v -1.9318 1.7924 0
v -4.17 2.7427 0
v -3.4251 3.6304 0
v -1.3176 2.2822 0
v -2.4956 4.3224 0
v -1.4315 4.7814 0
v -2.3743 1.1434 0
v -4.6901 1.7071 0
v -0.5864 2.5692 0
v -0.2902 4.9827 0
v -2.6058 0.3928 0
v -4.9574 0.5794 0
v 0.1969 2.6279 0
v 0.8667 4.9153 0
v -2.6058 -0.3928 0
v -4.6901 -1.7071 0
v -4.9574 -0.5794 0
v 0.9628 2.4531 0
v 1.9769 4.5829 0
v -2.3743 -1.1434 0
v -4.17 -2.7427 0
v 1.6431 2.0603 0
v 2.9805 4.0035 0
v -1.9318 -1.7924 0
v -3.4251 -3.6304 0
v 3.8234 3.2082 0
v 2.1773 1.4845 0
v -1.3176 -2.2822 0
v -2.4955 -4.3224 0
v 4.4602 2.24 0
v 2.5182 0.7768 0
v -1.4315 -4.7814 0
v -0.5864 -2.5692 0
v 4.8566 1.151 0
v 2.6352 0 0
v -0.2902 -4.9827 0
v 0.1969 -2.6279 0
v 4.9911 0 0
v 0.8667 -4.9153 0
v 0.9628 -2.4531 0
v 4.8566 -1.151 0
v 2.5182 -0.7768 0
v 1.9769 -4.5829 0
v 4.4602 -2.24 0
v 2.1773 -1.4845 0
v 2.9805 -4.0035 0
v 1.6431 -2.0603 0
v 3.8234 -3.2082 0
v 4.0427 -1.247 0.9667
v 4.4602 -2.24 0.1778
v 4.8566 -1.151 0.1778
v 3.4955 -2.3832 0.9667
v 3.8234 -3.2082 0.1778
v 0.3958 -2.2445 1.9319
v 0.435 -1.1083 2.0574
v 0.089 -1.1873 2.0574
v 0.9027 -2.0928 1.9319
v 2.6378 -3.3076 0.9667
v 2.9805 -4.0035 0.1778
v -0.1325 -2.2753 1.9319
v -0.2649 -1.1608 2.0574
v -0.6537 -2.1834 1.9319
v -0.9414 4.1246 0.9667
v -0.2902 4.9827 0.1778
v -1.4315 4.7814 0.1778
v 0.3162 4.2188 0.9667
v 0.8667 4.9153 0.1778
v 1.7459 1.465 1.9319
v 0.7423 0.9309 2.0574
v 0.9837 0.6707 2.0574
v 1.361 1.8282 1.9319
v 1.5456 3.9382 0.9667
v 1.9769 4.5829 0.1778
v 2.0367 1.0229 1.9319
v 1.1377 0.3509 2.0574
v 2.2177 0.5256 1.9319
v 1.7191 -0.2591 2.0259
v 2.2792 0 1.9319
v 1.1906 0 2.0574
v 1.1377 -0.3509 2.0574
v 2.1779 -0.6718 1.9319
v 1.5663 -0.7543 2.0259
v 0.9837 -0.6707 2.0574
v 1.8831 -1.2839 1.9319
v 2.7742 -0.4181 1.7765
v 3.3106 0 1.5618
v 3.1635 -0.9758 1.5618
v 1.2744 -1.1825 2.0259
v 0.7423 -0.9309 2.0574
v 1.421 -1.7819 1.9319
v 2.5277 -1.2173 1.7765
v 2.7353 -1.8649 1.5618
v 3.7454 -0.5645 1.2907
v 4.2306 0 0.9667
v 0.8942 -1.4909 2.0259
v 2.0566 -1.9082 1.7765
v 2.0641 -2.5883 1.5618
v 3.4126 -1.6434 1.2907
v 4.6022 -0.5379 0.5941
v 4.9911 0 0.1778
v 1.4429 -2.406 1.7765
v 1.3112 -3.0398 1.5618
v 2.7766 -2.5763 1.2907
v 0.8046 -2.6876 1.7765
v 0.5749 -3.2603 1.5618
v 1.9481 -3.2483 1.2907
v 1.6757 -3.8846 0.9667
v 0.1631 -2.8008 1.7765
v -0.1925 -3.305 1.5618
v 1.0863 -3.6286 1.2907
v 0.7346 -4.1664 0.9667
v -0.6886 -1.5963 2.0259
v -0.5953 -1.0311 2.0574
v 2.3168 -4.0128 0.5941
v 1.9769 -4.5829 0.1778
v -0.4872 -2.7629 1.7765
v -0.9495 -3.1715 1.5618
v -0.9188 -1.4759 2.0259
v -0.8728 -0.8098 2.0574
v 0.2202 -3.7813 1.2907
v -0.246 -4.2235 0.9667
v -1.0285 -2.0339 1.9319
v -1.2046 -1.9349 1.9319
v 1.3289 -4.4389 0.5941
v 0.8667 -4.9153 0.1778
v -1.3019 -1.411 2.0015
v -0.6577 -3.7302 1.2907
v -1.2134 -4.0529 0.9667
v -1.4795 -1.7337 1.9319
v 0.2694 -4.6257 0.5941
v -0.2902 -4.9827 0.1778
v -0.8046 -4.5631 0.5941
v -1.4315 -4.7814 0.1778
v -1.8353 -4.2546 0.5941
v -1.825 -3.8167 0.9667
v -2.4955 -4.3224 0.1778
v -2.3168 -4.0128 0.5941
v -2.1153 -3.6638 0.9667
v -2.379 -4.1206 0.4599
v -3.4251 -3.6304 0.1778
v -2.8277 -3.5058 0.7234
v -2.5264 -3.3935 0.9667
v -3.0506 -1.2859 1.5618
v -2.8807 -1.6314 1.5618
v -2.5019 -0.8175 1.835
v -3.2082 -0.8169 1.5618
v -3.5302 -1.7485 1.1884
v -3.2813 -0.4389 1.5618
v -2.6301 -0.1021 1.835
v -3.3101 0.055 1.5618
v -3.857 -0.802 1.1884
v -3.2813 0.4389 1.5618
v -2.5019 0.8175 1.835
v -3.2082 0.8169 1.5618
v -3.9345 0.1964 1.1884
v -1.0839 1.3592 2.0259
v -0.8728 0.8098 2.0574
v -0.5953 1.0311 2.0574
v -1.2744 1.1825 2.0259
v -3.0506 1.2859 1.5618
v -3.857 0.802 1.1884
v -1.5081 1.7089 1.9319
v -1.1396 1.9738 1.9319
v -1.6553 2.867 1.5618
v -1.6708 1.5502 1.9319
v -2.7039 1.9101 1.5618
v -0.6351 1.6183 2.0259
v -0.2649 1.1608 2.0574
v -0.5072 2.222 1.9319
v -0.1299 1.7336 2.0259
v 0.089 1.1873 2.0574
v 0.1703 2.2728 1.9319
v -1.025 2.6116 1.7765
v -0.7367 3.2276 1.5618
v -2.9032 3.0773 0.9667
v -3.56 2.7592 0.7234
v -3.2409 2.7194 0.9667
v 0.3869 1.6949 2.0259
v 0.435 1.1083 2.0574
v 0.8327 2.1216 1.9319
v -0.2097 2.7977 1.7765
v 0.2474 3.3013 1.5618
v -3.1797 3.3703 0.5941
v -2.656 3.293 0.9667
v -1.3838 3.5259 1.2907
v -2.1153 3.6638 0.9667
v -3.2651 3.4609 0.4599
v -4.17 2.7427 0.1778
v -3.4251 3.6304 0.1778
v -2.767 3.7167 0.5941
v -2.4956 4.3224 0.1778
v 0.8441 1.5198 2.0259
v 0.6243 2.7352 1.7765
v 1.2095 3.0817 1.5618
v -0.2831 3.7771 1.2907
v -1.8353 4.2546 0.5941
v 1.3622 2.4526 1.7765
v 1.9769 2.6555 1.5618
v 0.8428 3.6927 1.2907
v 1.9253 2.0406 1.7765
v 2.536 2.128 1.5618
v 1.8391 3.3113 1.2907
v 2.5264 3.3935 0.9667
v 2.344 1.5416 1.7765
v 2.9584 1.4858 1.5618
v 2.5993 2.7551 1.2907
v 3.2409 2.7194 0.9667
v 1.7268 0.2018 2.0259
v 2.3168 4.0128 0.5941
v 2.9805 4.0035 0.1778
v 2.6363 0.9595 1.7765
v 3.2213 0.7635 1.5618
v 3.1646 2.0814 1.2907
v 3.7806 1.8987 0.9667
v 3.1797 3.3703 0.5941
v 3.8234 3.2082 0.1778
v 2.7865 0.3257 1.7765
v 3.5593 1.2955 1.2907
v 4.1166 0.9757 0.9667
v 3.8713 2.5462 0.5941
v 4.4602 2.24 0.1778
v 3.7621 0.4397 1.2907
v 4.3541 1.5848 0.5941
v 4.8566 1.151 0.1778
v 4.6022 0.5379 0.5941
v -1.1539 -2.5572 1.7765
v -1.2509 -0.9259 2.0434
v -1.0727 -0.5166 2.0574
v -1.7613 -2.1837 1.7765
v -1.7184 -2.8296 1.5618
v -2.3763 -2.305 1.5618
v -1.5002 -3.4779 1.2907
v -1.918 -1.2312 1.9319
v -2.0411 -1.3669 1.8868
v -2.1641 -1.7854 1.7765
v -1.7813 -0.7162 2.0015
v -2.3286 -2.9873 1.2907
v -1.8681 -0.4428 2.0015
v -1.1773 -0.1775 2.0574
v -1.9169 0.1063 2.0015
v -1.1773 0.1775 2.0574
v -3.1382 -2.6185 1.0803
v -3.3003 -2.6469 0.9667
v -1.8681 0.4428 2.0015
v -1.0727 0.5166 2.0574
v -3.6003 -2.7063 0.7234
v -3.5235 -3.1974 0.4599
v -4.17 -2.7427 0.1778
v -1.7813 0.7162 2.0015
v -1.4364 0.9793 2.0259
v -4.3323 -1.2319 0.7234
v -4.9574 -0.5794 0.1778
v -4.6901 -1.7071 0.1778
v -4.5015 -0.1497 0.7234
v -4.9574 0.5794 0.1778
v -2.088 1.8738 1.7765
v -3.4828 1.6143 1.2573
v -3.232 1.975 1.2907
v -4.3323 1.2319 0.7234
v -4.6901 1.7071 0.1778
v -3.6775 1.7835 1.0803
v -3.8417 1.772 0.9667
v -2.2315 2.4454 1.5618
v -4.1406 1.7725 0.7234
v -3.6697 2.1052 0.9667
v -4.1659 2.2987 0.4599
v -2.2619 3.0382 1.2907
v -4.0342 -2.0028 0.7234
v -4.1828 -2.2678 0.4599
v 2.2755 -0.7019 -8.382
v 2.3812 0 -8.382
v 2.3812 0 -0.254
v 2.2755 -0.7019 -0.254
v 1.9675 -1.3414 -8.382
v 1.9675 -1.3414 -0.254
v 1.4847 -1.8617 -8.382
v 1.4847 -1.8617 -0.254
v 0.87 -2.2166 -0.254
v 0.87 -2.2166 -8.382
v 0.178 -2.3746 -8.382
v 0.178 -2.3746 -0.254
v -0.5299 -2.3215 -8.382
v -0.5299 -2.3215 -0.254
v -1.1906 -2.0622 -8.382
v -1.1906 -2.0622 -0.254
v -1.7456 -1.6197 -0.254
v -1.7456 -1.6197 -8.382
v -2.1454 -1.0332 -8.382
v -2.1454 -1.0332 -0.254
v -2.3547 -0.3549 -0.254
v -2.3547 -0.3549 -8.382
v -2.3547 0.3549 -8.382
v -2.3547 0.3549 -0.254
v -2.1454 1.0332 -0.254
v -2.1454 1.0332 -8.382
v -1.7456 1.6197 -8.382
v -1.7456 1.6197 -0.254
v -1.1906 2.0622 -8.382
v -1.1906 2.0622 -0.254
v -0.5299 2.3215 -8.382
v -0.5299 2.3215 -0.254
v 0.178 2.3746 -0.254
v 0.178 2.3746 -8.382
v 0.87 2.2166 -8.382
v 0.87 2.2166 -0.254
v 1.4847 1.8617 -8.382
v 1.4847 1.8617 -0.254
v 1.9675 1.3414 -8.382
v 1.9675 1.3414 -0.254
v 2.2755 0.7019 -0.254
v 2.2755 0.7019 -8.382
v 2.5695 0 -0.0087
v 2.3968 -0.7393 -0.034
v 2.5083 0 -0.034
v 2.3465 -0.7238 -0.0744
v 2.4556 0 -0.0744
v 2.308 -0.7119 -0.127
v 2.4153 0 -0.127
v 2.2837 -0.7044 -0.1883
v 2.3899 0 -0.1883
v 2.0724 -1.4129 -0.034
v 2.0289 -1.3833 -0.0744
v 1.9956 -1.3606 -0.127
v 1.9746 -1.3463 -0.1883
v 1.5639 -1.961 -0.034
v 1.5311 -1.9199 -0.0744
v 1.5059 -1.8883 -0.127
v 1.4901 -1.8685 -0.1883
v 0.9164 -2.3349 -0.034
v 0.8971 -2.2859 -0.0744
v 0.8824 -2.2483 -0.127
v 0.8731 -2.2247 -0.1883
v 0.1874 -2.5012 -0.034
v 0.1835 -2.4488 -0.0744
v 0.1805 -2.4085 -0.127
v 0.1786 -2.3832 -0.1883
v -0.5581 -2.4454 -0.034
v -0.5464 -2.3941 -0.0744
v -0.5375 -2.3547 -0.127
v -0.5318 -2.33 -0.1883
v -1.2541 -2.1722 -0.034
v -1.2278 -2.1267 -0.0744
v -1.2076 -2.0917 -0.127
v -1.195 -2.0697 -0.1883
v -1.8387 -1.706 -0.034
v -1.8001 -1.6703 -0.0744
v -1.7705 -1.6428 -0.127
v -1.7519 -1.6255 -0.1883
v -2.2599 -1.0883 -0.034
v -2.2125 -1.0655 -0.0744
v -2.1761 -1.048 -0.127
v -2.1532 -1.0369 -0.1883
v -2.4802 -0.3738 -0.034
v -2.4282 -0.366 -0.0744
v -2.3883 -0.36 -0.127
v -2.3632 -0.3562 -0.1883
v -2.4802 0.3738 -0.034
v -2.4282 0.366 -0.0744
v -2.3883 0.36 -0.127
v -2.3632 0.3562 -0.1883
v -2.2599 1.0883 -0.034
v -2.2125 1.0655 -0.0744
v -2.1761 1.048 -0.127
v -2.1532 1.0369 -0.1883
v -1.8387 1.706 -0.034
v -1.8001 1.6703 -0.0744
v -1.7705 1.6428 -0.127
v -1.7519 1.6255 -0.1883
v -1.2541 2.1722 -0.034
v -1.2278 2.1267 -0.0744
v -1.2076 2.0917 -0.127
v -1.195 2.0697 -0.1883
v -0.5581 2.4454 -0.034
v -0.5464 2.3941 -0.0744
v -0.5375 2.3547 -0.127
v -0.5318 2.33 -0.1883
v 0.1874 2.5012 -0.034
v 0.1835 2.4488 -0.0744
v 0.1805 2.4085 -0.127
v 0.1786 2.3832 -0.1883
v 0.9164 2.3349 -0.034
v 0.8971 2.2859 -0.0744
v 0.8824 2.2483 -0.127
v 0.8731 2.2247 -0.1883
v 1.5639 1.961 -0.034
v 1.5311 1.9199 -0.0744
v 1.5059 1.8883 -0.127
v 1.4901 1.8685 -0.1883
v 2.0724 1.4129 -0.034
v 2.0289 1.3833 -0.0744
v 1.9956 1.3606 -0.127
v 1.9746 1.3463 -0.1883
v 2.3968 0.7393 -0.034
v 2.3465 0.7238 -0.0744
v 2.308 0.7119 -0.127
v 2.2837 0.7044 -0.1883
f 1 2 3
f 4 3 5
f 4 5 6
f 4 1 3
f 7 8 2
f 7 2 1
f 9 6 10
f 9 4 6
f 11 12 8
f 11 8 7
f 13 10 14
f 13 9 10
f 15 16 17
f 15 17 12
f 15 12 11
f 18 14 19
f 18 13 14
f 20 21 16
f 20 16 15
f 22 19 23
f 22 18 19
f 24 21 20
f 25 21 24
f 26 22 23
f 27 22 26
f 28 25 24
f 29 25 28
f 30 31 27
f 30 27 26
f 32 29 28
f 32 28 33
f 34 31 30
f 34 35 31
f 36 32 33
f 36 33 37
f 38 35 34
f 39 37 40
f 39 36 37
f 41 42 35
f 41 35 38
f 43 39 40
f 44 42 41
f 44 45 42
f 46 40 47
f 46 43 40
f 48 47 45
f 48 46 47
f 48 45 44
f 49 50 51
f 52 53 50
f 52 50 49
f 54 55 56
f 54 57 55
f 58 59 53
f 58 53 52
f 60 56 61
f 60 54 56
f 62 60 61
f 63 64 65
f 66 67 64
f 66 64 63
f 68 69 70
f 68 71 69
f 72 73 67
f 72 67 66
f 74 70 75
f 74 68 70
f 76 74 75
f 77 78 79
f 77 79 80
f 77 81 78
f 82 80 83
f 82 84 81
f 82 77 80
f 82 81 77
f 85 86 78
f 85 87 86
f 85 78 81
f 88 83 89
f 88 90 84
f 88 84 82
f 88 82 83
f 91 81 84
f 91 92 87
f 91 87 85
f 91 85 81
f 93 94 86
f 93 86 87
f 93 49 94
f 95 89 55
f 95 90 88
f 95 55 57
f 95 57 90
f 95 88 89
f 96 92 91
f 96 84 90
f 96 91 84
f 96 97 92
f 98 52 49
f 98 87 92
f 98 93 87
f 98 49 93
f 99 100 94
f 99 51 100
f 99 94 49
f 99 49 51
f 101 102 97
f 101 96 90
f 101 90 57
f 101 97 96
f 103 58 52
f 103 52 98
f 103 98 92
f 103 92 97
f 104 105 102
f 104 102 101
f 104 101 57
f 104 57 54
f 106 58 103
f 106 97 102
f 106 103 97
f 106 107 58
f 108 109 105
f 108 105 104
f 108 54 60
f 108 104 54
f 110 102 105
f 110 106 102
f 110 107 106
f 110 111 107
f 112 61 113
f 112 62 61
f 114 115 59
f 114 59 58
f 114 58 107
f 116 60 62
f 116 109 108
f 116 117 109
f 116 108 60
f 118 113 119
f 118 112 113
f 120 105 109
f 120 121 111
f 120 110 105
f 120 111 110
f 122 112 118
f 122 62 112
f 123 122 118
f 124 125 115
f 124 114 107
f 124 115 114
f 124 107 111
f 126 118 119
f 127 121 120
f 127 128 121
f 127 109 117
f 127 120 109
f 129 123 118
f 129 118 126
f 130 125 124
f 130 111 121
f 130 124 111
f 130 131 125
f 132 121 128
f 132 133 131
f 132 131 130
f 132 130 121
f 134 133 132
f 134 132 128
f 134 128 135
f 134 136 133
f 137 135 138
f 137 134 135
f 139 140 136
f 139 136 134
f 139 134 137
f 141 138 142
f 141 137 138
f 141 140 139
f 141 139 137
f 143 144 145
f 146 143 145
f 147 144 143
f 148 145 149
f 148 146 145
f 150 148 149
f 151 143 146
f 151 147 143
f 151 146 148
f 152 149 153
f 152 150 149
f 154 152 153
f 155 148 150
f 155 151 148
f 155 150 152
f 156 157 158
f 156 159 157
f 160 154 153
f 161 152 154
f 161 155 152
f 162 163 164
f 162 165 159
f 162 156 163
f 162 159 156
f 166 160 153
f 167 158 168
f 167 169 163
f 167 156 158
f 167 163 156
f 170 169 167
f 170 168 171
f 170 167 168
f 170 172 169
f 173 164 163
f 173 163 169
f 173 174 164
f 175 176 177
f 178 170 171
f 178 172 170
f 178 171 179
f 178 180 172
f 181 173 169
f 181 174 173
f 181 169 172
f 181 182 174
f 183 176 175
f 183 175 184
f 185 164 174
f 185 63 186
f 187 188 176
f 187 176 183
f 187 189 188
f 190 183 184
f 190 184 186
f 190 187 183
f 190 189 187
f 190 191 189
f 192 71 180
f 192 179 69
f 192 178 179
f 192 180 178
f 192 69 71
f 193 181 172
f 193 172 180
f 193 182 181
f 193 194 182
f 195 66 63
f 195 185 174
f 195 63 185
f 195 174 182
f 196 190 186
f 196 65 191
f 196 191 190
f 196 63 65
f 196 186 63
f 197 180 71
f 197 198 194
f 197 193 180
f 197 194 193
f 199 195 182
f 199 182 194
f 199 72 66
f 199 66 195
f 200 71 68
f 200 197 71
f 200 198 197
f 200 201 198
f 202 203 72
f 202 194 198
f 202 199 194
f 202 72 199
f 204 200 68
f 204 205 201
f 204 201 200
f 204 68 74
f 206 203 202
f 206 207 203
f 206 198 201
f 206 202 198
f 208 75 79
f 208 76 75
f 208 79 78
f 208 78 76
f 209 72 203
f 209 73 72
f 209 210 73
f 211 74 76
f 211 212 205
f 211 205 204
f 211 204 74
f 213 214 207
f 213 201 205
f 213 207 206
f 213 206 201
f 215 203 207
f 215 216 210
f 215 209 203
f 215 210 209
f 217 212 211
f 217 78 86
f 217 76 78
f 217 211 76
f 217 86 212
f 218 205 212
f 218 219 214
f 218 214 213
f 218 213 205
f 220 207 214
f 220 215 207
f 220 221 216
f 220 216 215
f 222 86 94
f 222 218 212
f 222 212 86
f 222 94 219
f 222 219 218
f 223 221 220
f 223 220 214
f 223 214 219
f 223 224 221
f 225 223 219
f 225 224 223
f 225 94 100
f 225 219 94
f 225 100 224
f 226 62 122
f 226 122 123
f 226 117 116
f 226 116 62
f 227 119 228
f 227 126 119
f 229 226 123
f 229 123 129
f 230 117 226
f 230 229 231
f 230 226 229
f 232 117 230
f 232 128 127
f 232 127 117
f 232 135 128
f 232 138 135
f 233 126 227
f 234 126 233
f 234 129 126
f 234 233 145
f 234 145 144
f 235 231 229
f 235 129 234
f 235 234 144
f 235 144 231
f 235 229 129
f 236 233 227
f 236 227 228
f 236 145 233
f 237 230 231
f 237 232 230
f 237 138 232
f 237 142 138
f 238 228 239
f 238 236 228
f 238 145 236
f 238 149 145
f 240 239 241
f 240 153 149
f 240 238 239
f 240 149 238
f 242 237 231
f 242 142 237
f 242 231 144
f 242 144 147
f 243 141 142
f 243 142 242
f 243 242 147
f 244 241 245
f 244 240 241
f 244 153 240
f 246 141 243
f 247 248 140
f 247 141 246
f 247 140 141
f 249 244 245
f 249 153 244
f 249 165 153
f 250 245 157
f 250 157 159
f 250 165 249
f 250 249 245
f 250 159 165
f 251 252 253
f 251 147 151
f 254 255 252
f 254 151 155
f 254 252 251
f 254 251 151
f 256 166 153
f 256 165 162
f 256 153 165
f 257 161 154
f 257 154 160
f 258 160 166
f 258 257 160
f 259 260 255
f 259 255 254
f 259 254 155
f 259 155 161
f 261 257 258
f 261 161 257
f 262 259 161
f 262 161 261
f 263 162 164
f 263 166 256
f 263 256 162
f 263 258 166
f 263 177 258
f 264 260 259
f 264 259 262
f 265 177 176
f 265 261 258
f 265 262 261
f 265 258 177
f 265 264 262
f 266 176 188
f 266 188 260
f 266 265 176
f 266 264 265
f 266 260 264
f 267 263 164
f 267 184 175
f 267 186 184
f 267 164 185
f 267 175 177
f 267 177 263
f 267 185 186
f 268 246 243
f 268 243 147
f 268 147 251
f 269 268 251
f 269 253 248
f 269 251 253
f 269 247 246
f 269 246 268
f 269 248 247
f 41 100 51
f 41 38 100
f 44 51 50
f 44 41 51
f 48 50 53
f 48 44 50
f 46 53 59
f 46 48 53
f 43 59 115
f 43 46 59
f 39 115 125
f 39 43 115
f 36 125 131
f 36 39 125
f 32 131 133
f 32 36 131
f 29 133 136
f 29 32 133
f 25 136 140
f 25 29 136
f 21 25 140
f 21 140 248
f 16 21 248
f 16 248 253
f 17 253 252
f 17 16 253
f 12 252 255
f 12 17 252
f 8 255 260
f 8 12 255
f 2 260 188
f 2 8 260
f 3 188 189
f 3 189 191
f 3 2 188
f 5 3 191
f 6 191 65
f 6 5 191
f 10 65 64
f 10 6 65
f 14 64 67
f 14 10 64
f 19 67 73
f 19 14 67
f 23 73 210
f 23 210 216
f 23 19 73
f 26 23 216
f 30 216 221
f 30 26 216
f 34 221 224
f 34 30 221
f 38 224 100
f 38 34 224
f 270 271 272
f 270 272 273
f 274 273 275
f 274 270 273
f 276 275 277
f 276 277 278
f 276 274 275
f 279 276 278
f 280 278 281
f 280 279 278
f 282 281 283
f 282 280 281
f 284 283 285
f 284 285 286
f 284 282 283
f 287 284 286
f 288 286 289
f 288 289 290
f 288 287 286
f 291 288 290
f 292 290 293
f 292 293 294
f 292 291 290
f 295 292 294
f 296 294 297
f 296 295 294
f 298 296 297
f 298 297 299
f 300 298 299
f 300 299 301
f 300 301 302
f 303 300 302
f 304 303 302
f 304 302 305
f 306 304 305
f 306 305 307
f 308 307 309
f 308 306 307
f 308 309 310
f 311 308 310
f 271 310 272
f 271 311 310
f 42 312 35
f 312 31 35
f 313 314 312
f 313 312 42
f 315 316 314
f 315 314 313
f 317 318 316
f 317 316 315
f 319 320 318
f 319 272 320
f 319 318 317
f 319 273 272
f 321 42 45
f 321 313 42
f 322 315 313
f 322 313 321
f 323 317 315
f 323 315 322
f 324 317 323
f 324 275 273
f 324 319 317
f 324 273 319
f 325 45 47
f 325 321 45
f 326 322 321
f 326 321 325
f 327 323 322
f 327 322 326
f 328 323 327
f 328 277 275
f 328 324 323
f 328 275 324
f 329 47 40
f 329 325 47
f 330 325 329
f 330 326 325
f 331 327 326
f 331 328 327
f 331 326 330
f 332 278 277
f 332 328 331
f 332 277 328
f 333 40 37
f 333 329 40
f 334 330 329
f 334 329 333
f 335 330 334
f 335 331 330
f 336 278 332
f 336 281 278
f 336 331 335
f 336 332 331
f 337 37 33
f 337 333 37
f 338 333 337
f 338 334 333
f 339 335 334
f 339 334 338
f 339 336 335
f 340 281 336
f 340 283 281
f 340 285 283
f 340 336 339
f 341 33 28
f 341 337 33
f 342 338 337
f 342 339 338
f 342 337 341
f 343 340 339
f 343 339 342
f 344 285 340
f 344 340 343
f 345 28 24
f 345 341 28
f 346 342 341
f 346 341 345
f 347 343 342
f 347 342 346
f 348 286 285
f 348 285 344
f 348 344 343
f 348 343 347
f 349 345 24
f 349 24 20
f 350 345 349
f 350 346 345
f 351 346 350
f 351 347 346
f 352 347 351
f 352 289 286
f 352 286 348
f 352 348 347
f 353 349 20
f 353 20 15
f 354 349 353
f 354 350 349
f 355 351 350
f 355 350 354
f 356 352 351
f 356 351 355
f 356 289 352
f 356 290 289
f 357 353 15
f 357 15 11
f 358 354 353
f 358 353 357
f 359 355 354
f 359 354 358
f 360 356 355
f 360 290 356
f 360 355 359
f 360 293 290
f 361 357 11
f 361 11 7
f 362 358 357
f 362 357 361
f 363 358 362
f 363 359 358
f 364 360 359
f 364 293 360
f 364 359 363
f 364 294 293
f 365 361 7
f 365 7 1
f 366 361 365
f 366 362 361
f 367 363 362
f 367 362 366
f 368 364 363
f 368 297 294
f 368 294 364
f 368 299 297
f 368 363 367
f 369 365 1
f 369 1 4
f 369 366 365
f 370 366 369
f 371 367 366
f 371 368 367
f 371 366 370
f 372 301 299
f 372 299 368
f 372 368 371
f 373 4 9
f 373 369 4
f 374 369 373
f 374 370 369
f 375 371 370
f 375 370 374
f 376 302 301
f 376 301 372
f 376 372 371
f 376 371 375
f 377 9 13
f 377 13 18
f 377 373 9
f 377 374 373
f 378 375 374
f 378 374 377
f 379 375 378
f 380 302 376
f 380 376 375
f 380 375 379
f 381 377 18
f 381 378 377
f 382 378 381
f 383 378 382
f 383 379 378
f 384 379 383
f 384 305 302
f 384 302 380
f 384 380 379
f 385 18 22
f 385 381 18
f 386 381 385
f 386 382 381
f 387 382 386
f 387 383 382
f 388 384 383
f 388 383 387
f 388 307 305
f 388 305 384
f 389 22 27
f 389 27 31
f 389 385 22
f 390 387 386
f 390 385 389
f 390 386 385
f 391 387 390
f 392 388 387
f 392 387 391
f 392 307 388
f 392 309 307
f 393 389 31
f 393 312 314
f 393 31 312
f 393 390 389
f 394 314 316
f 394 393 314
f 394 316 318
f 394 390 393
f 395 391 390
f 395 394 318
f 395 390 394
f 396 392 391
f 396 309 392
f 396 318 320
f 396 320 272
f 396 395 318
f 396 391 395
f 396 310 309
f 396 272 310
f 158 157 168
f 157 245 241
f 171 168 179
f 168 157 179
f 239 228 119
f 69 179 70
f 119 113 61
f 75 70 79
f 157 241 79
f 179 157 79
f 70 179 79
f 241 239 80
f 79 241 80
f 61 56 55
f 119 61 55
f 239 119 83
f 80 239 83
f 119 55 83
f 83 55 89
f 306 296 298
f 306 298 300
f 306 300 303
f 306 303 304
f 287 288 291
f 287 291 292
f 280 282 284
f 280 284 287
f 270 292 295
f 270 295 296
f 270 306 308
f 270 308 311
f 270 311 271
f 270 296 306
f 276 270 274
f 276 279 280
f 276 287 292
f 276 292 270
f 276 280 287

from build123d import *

# Parameters (mm, degrees)
CUT_EXTRUDE1_DEPTH      = 21.101424287
CUT_EXTRUDE1_DEPTH_BACK = 21.101424287
CUT_EXTRUDE2_DEPTH      = 21.101424287
CUT_EXTRUDE2_DEPTH_BACK = 21.101424287
FILLET2_R               = 0.254
CUT_EXTRUDE3_DEPTH      = 21.101424287
CUT_EXTRUDE3_DEPTH_BACK = 21.101424287
SKETCH7_W               = 2.38125
SKETCH7_H               = 17.740225881


with BuildPart() as part:
    # Sketch2 → Revolve1 (revolve)
    with BuildSketch(Plane(origin=(0, 0, 0), x_dir=(0, 0, -1), z_dir=(1, 0, 0)), mode=Mode.PRIVATE) as revolve1_sk:
        with BuildLine():
            Line((-18.8214, 0), (-18.8214, 1.190625))
            Line((-18.8214, 1.190625), (-2.0574, 1.190625))
            ThreePointArc((-2.0574, 1.190625), (-1.561820484, 3.310560517), (-0.1778, 4.9911))
            Line((-0.1778, 4.9911), (0, 4.9911))
            Line((0, 4.9911), (0, 2.38125))
            Line((0, 2.38125), (8.382, 2.38125))
            Line((8.382, 2.38125), (8.382, 2.24506403))
            Line((8.382, 2.24506403), (8.382, 0))
            Line((8.382, 0), (-18.8214, 0))
        make_face()
    revolve(revolve1_sk.sketch.rotate(Axis((0, 0, 18.8214), (0, 0, -1)), 90), axis=Axis((0, 0, 18.8214), (0, 0, -1)))

    # Sketch3 → Cut-Extrude1 (cut, two sides: drawn at the far end of the back side and taken through both)
    with BuildSketch(Plane(origin=(0, 0, 0), x_dir=(1, 0, 0), z_dir=(0, 1, 0)).offset(-CUT_EXTRUDE1_DEPTH_BACK)):
        Polygon((0, -18.8214), (1.393825, -17.004931895), (1.393825, -19.3294), (-1.393825, -19.3294), (-1.393825, -17.004931895), align=None)
    extrude(amount=CUT_EXTRUDE1_DEPTH + CUT_EXTRUDE1_DEPTH_BACK, mode=Mode.SUBTRACT)

    # Sketch5 → Cut-Extrude2 (cut, two sides: drawn at the far end of the back side and taken through both)
    with BuildSketch(Plane(origin=(0, 0, 0), x_dir=(0, 0, -1), z_dir=(1, 0, 0)).offset(-CUT_EXTRUDE2_DEPTH_BACK)):
        Polygon((-18.8214, 0), (-17.26974729, 1.508125), (-19.1389, 1.508125), (-19.1389, -1.508125), (-17.26974729, -1.508125), align=None)
    extrude(amount=CUT_EXTRUDE2_DEPTH + CUT_EXTRUDE2_DEPTH_BACK, mode=Mode.SUBTRACT)

    # Fillet2
    fillet2_edges = [part.edges().sort_by_distance(p)[0] for p in [
        (-2.38125, 0, 0),
    ]]
    fillet(fillet2_edges, radius=FILLET2_R)

    # Sketch7 → Cut-Extrude3 (cut, two sides: drawn at the far end of the back side and taken through both)
    with BuildSketch(Plane(origin=(0, 0, 0), x_dir=(1, 0, 0), z_dir=(0, 1, 0)).offset(-CUT_EXTRUDE3_DEPTH_BACK)):
        with Locations((0, -10.927512941)):
            Rectangle(SKETCH7_W, SKETCH7_H)
    extrude(amount=CUT_EXTRUDE3_DEPTH + CUT_EXTRUDE3_DEPTH_BACK, mode=Mode.SUBTRACT)


solid = part.part
